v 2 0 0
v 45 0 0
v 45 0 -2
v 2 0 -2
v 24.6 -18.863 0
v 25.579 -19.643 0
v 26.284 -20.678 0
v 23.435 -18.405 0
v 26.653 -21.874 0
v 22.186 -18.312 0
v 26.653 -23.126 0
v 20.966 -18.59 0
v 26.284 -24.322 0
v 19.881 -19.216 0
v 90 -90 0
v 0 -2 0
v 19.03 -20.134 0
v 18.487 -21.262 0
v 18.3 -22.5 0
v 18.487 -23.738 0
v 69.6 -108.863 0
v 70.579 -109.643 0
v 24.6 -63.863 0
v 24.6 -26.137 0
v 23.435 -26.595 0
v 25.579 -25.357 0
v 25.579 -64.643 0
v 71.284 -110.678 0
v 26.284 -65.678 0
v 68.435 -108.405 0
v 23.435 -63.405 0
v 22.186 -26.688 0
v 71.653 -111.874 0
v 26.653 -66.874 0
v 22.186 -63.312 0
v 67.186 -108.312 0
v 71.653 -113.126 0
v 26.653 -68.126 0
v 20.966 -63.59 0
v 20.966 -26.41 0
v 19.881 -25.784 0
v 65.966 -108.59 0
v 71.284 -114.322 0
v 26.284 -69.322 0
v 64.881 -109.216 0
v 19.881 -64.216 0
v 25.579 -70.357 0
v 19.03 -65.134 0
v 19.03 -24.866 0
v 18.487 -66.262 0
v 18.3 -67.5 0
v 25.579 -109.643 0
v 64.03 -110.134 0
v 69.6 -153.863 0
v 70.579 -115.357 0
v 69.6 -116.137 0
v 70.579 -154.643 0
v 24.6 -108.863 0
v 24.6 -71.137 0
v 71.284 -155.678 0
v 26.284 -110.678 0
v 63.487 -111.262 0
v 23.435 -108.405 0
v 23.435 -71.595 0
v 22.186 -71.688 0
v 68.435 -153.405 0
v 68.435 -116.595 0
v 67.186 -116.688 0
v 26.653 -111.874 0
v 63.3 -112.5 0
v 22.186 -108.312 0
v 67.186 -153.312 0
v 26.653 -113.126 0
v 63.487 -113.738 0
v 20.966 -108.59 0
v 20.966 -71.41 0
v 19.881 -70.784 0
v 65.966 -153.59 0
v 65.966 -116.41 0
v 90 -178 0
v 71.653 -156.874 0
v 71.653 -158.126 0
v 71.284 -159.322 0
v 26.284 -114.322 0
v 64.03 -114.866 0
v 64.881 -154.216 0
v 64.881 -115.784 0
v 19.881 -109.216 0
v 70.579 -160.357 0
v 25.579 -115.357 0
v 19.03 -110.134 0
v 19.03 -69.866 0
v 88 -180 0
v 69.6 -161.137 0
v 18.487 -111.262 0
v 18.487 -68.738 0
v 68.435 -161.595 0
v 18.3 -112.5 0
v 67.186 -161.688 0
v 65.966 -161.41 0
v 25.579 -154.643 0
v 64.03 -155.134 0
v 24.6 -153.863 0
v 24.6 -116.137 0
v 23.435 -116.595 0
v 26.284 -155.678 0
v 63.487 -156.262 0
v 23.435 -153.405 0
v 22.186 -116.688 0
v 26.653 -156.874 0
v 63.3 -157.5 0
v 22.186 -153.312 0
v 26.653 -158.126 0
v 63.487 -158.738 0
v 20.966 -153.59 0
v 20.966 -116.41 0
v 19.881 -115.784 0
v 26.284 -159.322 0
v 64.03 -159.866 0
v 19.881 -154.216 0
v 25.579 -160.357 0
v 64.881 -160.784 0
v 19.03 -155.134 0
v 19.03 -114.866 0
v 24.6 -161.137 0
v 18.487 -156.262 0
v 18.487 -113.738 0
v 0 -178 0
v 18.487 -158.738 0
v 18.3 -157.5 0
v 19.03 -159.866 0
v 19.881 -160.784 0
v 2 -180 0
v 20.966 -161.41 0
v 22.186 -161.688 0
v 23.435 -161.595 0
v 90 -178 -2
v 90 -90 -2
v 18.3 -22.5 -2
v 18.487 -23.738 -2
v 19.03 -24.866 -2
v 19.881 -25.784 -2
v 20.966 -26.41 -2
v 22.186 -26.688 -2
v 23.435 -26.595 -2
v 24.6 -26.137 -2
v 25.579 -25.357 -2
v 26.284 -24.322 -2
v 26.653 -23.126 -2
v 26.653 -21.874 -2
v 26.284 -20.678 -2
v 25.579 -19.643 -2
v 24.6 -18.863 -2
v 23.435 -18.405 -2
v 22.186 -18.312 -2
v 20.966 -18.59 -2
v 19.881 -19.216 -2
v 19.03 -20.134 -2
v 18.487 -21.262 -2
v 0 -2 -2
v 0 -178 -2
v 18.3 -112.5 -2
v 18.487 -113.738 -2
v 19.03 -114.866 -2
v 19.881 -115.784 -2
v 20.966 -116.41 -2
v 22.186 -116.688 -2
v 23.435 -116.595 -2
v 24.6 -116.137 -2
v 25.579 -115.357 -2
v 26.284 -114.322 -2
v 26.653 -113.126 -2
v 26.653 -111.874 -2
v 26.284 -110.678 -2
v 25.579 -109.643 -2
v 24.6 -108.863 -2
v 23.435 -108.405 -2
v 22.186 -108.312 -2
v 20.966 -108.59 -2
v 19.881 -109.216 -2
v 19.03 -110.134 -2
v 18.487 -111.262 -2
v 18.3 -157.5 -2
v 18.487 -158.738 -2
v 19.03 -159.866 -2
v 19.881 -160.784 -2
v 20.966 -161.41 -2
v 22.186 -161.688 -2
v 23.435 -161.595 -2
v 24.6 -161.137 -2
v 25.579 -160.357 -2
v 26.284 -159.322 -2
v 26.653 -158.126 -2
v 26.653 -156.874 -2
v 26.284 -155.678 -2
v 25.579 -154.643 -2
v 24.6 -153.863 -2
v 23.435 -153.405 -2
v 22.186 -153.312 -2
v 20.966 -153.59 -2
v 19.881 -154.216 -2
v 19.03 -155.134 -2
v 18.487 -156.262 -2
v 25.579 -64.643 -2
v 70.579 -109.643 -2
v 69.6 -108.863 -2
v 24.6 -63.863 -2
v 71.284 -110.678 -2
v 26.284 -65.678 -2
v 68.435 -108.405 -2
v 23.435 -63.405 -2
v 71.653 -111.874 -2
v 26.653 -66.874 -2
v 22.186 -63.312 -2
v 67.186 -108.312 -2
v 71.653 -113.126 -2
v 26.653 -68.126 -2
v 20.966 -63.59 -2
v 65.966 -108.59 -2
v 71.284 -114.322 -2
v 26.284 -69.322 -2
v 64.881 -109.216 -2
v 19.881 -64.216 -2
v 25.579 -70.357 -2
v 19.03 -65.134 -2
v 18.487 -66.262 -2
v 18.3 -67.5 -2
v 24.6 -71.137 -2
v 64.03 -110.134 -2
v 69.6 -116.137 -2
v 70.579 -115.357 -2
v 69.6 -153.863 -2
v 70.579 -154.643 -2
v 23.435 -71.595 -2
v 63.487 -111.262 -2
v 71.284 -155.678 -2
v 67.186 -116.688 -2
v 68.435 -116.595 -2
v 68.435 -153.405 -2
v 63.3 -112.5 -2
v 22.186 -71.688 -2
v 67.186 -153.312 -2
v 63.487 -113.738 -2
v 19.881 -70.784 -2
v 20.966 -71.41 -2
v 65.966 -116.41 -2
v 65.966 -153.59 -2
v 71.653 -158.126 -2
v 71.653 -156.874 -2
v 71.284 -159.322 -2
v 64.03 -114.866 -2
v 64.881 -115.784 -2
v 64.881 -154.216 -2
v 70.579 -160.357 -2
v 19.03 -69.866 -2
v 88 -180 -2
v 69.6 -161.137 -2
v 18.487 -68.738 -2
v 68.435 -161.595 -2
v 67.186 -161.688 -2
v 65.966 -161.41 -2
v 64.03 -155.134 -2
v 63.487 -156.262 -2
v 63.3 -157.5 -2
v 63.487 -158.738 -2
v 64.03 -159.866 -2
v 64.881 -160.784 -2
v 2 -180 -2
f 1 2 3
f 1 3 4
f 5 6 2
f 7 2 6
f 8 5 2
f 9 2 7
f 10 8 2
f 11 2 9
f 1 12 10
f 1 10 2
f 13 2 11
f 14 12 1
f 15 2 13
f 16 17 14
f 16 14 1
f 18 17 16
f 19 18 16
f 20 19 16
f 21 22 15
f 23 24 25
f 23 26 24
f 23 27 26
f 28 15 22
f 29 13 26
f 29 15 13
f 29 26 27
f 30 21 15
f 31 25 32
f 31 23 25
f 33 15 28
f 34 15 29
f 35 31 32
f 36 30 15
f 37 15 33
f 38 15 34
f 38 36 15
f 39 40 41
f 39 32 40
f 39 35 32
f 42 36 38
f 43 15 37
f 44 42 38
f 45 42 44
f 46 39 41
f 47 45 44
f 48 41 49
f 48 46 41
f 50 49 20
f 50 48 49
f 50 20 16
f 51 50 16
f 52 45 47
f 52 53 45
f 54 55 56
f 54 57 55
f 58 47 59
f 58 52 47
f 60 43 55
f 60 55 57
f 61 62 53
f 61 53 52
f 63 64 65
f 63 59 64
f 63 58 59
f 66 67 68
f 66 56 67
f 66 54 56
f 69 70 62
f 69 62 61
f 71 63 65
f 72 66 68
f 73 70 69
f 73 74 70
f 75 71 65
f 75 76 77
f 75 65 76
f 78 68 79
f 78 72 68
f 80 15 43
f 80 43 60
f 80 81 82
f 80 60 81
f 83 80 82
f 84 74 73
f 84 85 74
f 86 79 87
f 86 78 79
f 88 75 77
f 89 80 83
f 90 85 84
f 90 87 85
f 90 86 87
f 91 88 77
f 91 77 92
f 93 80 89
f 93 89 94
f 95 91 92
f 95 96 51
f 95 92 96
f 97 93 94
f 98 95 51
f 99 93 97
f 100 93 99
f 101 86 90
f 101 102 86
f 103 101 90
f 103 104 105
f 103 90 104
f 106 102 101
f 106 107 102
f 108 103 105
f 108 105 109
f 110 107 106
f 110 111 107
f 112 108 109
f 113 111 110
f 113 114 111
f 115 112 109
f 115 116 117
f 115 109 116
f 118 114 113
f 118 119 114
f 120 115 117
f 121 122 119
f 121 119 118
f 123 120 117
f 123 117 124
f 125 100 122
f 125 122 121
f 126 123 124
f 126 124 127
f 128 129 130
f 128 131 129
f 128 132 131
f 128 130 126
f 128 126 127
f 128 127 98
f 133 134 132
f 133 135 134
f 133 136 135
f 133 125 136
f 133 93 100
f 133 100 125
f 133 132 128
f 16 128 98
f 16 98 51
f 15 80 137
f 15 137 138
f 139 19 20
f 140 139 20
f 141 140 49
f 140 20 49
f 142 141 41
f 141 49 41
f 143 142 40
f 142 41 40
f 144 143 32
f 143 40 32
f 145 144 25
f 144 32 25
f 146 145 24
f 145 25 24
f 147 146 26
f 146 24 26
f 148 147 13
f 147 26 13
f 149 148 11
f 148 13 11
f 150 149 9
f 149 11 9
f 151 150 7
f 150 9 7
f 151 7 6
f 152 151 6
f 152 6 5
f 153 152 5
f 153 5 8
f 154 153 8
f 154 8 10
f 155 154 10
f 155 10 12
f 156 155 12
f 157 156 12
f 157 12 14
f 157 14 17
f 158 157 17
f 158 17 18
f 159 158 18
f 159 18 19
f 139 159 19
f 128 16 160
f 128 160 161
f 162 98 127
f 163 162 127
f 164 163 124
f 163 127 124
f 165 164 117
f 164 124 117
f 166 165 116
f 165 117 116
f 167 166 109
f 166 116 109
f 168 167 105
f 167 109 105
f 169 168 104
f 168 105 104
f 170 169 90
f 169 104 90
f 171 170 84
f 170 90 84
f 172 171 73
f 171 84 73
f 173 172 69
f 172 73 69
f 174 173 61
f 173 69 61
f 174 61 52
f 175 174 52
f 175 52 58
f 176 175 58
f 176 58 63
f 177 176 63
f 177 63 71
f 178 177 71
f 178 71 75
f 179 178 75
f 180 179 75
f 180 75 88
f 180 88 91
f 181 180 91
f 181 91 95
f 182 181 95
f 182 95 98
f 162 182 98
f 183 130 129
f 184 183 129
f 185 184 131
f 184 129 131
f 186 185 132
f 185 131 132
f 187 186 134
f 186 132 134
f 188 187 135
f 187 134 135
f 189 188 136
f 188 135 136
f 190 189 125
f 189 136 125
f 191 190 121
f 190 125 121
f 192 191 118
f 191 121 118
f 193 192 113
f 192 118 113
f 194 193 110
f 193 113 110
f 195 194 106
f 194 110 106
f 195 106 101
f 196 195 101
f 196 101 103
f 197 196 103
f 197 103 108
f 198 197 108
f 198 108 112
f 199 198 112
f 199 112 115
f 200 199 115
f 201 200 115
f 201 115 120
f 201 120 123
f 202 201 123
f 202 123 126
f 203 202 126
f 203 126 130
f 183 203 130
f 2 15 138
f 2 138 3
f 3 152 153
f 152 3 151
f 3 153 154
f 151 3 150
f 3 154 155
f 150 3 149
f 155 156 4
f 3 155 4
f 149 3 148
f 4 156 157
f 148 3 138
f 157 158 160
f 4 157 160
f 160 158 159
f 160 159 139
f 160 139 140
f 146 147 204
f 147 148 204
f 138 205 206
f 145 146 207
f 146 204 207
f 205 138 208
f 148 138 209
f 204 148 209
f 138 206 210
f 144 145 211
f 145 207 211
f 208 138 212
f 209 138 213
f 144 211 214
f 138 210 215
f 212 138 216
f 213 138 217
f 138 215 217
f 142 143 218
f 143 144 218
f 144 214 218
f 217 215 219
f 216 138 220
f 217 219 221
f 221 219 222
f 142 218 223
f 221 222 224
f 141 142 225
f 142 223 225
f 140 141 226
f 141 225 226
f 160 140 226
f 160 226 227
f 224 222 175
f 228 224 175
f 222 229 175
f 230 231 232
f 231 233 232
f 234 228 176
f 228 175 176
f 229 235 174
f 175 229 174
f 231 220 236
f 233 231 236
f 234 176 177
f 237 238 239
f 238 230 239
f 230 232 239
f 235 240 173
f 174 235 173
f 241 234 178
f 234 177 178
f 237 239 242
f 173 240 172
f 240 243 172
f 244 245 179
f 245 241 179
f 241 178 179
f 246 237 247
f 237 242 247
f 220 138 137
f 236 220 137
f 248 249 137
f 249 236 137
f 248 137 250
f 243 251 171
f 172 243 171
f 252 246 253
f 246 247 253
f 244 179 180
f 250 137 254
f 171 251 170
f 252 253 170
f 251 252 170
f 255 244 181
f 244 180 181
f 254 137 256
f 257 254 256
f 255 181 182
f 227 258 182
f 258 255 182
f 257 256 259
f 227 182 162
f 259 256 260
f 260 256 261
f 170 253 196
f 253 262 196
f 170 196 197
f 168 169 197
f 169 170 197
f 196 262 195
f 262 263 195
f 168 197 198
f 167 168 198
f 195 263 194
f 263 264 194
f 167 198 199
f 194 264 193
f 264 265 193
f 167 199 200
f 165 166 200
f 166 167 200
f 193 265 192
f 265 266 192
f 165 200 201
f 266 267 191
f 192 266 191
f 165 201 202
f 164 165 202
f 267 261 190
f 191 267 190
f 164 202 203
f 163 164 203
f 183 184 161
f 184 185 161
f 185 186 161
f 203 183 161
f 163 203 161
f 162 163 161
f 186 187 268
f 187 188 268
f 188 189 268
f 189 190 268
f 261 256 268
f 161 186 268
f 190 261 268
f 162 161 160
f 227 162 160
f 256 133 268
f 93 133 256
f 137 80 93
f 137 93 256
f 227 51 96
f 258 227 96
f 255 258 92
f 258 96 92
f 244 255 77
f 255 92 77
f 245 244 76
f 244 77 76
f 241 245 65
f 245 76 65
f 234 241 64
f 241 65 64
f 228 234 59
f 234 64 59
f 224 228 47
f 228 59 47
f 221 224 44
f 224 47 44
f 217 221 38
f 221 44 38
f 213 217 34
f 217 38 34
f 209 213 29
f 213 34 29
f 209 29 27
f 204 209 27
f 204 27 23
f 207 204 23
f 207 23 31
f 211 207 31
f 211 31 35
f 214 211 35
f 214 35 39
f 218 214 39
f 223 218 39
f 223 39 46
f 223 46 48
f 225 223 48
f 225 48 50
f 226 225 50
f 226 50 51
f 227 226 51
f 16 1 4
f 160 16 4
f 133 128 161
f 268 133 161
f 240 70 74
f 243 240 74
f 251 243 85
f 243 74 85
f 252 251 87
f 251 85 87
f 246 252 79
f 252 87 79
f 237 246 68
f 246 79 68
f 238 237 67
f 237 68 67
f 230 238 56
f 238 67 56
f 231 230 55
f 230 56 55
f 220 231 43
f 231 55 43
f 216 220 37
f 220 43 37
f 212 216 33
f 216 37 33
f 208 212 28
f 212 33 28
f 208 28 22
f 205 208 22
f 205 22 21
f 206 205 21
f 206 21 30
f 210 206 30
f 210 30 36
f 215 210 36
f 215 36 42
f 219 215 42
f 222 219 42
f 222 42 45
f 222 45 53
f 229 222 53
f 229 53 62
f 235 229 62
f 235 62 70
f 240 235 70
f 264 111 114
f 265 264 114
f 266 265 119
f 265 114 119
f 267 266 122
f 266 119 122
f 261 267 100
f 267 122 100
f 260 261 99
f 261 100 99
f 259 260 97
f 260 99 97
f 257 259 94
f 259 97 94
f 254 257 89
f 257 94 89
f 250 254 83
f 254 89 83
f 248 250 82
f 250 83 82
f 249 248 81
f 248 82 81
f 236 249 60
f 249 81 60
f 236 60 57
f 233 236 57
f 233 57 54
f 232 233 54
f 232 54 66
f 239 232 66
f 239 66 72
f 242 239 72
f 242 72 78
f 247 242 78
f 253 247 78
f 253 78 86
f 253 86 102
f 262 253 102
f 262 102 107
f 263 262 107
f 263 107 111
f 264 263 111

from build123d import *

# Parameters (mm, degrees)
EXTRUDE_1_DEPTH       = 2
HOLE_WIZARD_M81_D     = 8.4
HOLE_WIZARD_M81_DEPTH = 2
CHAMFER_1_SIZE        = 2


with BuildPart() as part:
    # Эскиз1 → Бобышка-Вытянуть1 (new body)
    with BuildSketch(Plane(origin=(0, 0, 0), x_dir=(1, 0, 0), z_dir=(0, 0, -1))):
        Polygon((0, 0), (0, 180), (90, 180), (90, 90), (45, 0), align=None)
    extrude(amount=EXTRUDE_1_DEPTH)

    # Отверстие с зазором M81
    with Locations(Plane(origin=(0, 0, -2), x_dir=(1, 0, 0), z_dir=(0, 0, -1))):
        with Locations((22.5, 157.5), (22.5, 112.5), (22.5, 67.5), (22.5, 22.5), (67.5, 157.5), (67.5, 112.5)):
            Hole(HOLE_WIZARD_M81_D / 2, depth=HOLE_WIZARD_M81_DEPTH)

    # Фаска1
    chamfer_1_edges = [part.edges().sort_by_distance(p)[0] for p in [
        (0, 0, -1),
        (0, -180, -1),
        (90, -180, -1),
    ]]
    chamfer(chamfer_1_edges, length=CHAMFER_1_SIZE)


solid = part.part
